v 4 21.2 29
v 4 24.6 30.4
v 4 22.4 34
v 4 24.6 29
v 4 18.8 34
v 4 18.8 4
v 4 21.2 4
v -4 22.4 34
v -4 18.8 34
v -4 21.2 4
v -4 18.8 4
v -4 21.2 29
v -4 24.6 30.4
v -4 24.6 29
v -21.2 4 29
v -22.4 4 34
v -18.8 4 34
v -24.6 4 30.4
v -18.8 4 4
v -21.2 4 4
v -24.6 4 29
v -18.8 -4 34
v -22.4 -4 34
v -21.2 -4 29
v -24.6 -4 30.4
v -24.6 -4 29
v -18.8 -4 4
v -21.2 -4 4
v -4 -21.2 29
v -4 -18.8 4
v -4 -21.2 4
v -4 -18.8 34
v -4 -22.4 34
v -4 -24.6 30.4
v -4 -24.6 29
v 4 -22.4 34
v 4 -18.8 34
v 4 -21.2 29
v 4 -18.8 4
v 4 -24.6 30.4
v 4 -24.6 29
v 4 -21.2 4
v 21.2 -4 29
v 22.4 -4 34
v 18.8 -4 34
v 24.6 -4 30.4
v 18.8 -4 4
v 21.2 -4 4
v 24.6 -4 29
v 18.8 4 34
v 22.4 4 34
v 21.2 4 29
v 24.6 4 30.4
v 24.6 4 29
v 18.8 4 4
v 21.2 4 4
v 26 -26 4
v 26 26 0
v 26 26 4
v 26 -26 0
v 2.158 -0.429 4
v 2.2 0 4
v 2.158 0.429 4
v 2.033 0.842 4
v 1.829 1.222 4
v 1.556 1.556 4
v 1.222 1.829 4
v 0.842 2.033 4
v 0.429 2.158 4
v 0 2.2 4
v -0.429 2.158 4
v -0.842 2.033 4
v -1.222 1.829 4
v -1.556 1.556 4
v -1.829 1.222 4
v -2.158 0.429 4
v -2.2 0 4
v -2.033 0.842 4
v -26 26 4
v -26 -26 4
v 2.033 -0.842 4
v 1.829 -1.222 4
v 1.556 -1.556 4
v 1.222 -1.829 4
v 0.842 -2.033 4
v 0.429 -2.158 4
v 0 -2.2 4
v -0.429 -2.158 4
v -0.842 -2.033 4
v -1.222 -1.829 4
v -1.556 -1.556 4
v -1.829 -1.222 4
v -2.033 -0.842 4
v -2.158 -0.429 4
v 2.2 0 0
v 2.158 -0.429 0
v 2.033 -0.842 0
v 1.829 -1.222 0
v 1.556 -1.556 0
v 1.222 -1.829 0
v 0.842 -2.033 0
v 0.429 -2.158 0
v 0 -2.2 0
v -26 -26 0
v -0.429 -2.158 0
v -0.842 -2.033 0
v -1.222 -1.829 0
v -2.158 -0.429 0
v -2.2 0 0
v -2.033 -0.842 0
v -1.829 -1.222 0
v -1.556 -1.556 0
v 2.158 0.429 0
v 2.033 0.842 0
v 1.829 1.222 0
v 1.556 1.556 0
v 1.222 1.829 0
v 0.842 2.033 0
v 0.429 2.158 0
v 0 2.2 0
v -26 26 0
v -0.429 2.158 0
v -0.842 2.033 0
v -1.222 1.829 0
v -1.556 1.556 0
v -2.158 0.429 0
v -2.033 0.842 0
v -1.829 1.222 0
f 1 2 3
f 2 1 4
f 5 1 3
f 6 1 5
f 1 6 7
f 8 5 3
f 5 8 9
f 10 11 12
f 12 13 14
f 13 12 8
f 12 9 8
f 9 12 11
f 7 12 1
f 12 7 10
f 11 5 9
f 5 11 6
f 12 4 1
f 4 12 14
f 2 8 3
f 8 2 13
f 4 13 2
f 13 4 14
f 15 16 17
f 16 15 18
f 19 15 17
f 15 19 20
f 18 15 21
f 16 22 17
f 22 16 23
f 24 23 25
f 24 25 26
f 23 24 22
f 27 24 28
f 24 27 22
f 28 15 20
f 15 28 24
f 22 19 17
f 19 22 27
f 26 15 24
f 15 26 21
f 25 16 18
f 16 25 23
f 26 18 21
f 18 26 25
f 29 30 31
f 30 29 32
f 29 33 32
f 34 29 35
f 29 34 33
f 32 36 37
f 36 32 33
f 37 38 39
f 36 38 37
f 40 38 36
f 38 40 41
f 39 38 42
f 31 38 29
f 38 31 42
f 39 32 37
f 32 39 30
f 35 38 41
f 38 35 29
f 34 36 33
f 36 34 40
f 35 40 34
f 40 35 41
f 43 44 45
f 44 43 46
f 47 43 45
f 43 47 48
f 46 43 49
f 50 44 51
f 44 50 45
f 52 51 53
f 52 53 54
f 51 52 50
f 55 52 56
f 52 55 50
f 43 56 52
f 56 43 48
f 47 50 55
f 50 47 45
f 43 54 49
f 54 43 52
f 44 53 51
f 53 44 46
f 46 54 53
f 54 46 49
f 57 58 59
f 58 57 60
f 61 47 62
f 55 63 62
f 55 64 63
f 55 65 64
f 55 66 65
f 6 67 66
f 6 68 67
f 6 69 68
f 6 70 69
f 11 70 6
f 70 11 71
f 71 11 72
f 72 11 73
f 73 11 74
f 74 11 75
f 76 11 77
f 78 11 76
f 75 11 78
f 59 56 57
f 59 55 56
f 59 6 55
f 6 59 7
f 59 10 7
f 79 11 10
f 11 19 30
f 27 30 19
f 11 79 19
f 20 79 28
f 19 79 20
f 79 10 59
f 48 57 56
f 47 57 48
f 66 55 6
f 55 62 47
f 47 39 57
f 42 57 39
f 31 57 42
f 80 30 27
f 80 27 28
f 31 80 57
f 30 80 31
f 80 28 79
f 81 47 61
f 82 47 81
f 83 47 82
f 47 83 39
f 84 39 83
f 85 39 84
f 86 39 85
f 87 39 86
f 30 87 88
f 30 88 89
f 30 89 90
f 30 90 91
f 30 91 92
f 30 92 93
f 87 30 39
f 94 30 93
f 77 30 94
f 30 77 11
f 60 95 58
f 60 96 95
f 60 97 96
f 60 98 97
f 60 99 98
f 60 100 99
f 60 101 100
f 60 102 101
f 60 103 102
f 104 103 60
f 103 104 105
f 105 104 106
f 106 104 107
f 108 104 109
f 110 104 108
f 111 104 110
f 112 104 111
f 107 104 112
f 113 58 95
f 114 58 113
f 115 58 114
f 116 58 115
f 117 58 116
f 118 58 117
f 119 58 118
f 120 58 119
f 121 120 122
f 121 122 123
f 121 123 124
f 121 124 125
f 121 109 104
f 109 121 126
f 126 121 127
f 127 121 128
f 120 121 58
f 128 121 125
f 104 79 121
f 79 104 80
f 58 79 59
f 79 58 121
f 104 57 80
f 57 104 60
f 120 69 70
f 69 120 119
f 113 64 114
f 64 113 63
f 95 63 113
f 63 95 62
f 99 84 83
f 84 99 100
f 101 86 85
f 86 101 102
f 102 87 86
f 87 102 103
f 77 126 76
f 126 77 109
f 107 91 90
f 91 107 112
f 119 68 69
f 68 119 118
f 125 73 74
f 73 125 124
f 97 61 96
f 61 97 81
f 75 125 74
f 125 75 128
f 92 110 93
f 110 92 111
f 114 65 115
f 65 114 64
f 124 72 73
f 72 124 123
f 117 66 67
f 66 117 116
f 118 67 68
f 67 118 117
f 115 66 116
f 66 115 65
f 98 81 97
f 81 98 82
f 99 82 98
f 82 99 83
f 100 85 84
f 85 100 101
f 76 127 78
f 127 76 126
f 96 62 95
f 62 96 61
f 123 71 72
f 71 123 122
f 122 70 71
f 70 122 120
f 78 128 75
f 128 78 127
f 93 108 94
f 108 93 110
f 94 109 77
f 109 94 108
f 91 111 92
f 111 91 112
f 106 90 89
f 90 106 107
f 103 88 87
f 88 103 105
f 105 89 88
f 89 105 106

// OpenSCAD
$fn = 32;

// ----------------------------------------------------------------------
// Snap-fit latch: 4 arms, 30 mm tall, 3.6 mm undercut hooks
// ----------------------------------------------------------------------

// --- parameters (mm) ---
base_d = 52;              // base plate depth
base_h = 4;               // base plate thickness
span = 40;                // distance between opposite arms
arm_t = 2.4;              // arm thickness
arm_d = 8;                // arm width
height = 30;              // free arm length
head_len = 3.6;           // hook reach
head_h = 5;               // hook height
lead = 1.4;               // lead-in ramp thickness
bore_d = 4.4;             // base fixing bore
top_z = 34;               // height of the arm tips above the base

arms = 4;

difference() {
  union() {
    /* base plate, centred on the arm ring */
    translate([-26, -26, 0]) cube([base_d, base_d, base_h]);
    for (a = [0 : 360 / arms : 359]) rotate([0, 0, a]) {
    /* arm, sunk 0.5 mm into the base */
    translate([-arm_d / 2, span / 2 - arm_t / 2, base_h - 0.5]) cube([arm_d, arm_t, height + 0.5]);
    /* hook: a convex hull of a tall inner block and a thin outer lip
       gives a flat undercut below and a lead-in ramp on top */
    hull() {
      translate([-arm_d / 2, span / 2 + arm_t / 2 - 0.6, top_z - head_h]) cube([arm_d, lead + 0.4, head_h]);
      translate([-arm_d / 2, span / 2 + arm_t / 2 - 0.2, top_z - head_h]) cube([arm_d, head_len, lead]);
    }
    }
  }
  translate([0, 0, -2.5]) cylinder(h = base_h + 5, d = bore_d);
}
